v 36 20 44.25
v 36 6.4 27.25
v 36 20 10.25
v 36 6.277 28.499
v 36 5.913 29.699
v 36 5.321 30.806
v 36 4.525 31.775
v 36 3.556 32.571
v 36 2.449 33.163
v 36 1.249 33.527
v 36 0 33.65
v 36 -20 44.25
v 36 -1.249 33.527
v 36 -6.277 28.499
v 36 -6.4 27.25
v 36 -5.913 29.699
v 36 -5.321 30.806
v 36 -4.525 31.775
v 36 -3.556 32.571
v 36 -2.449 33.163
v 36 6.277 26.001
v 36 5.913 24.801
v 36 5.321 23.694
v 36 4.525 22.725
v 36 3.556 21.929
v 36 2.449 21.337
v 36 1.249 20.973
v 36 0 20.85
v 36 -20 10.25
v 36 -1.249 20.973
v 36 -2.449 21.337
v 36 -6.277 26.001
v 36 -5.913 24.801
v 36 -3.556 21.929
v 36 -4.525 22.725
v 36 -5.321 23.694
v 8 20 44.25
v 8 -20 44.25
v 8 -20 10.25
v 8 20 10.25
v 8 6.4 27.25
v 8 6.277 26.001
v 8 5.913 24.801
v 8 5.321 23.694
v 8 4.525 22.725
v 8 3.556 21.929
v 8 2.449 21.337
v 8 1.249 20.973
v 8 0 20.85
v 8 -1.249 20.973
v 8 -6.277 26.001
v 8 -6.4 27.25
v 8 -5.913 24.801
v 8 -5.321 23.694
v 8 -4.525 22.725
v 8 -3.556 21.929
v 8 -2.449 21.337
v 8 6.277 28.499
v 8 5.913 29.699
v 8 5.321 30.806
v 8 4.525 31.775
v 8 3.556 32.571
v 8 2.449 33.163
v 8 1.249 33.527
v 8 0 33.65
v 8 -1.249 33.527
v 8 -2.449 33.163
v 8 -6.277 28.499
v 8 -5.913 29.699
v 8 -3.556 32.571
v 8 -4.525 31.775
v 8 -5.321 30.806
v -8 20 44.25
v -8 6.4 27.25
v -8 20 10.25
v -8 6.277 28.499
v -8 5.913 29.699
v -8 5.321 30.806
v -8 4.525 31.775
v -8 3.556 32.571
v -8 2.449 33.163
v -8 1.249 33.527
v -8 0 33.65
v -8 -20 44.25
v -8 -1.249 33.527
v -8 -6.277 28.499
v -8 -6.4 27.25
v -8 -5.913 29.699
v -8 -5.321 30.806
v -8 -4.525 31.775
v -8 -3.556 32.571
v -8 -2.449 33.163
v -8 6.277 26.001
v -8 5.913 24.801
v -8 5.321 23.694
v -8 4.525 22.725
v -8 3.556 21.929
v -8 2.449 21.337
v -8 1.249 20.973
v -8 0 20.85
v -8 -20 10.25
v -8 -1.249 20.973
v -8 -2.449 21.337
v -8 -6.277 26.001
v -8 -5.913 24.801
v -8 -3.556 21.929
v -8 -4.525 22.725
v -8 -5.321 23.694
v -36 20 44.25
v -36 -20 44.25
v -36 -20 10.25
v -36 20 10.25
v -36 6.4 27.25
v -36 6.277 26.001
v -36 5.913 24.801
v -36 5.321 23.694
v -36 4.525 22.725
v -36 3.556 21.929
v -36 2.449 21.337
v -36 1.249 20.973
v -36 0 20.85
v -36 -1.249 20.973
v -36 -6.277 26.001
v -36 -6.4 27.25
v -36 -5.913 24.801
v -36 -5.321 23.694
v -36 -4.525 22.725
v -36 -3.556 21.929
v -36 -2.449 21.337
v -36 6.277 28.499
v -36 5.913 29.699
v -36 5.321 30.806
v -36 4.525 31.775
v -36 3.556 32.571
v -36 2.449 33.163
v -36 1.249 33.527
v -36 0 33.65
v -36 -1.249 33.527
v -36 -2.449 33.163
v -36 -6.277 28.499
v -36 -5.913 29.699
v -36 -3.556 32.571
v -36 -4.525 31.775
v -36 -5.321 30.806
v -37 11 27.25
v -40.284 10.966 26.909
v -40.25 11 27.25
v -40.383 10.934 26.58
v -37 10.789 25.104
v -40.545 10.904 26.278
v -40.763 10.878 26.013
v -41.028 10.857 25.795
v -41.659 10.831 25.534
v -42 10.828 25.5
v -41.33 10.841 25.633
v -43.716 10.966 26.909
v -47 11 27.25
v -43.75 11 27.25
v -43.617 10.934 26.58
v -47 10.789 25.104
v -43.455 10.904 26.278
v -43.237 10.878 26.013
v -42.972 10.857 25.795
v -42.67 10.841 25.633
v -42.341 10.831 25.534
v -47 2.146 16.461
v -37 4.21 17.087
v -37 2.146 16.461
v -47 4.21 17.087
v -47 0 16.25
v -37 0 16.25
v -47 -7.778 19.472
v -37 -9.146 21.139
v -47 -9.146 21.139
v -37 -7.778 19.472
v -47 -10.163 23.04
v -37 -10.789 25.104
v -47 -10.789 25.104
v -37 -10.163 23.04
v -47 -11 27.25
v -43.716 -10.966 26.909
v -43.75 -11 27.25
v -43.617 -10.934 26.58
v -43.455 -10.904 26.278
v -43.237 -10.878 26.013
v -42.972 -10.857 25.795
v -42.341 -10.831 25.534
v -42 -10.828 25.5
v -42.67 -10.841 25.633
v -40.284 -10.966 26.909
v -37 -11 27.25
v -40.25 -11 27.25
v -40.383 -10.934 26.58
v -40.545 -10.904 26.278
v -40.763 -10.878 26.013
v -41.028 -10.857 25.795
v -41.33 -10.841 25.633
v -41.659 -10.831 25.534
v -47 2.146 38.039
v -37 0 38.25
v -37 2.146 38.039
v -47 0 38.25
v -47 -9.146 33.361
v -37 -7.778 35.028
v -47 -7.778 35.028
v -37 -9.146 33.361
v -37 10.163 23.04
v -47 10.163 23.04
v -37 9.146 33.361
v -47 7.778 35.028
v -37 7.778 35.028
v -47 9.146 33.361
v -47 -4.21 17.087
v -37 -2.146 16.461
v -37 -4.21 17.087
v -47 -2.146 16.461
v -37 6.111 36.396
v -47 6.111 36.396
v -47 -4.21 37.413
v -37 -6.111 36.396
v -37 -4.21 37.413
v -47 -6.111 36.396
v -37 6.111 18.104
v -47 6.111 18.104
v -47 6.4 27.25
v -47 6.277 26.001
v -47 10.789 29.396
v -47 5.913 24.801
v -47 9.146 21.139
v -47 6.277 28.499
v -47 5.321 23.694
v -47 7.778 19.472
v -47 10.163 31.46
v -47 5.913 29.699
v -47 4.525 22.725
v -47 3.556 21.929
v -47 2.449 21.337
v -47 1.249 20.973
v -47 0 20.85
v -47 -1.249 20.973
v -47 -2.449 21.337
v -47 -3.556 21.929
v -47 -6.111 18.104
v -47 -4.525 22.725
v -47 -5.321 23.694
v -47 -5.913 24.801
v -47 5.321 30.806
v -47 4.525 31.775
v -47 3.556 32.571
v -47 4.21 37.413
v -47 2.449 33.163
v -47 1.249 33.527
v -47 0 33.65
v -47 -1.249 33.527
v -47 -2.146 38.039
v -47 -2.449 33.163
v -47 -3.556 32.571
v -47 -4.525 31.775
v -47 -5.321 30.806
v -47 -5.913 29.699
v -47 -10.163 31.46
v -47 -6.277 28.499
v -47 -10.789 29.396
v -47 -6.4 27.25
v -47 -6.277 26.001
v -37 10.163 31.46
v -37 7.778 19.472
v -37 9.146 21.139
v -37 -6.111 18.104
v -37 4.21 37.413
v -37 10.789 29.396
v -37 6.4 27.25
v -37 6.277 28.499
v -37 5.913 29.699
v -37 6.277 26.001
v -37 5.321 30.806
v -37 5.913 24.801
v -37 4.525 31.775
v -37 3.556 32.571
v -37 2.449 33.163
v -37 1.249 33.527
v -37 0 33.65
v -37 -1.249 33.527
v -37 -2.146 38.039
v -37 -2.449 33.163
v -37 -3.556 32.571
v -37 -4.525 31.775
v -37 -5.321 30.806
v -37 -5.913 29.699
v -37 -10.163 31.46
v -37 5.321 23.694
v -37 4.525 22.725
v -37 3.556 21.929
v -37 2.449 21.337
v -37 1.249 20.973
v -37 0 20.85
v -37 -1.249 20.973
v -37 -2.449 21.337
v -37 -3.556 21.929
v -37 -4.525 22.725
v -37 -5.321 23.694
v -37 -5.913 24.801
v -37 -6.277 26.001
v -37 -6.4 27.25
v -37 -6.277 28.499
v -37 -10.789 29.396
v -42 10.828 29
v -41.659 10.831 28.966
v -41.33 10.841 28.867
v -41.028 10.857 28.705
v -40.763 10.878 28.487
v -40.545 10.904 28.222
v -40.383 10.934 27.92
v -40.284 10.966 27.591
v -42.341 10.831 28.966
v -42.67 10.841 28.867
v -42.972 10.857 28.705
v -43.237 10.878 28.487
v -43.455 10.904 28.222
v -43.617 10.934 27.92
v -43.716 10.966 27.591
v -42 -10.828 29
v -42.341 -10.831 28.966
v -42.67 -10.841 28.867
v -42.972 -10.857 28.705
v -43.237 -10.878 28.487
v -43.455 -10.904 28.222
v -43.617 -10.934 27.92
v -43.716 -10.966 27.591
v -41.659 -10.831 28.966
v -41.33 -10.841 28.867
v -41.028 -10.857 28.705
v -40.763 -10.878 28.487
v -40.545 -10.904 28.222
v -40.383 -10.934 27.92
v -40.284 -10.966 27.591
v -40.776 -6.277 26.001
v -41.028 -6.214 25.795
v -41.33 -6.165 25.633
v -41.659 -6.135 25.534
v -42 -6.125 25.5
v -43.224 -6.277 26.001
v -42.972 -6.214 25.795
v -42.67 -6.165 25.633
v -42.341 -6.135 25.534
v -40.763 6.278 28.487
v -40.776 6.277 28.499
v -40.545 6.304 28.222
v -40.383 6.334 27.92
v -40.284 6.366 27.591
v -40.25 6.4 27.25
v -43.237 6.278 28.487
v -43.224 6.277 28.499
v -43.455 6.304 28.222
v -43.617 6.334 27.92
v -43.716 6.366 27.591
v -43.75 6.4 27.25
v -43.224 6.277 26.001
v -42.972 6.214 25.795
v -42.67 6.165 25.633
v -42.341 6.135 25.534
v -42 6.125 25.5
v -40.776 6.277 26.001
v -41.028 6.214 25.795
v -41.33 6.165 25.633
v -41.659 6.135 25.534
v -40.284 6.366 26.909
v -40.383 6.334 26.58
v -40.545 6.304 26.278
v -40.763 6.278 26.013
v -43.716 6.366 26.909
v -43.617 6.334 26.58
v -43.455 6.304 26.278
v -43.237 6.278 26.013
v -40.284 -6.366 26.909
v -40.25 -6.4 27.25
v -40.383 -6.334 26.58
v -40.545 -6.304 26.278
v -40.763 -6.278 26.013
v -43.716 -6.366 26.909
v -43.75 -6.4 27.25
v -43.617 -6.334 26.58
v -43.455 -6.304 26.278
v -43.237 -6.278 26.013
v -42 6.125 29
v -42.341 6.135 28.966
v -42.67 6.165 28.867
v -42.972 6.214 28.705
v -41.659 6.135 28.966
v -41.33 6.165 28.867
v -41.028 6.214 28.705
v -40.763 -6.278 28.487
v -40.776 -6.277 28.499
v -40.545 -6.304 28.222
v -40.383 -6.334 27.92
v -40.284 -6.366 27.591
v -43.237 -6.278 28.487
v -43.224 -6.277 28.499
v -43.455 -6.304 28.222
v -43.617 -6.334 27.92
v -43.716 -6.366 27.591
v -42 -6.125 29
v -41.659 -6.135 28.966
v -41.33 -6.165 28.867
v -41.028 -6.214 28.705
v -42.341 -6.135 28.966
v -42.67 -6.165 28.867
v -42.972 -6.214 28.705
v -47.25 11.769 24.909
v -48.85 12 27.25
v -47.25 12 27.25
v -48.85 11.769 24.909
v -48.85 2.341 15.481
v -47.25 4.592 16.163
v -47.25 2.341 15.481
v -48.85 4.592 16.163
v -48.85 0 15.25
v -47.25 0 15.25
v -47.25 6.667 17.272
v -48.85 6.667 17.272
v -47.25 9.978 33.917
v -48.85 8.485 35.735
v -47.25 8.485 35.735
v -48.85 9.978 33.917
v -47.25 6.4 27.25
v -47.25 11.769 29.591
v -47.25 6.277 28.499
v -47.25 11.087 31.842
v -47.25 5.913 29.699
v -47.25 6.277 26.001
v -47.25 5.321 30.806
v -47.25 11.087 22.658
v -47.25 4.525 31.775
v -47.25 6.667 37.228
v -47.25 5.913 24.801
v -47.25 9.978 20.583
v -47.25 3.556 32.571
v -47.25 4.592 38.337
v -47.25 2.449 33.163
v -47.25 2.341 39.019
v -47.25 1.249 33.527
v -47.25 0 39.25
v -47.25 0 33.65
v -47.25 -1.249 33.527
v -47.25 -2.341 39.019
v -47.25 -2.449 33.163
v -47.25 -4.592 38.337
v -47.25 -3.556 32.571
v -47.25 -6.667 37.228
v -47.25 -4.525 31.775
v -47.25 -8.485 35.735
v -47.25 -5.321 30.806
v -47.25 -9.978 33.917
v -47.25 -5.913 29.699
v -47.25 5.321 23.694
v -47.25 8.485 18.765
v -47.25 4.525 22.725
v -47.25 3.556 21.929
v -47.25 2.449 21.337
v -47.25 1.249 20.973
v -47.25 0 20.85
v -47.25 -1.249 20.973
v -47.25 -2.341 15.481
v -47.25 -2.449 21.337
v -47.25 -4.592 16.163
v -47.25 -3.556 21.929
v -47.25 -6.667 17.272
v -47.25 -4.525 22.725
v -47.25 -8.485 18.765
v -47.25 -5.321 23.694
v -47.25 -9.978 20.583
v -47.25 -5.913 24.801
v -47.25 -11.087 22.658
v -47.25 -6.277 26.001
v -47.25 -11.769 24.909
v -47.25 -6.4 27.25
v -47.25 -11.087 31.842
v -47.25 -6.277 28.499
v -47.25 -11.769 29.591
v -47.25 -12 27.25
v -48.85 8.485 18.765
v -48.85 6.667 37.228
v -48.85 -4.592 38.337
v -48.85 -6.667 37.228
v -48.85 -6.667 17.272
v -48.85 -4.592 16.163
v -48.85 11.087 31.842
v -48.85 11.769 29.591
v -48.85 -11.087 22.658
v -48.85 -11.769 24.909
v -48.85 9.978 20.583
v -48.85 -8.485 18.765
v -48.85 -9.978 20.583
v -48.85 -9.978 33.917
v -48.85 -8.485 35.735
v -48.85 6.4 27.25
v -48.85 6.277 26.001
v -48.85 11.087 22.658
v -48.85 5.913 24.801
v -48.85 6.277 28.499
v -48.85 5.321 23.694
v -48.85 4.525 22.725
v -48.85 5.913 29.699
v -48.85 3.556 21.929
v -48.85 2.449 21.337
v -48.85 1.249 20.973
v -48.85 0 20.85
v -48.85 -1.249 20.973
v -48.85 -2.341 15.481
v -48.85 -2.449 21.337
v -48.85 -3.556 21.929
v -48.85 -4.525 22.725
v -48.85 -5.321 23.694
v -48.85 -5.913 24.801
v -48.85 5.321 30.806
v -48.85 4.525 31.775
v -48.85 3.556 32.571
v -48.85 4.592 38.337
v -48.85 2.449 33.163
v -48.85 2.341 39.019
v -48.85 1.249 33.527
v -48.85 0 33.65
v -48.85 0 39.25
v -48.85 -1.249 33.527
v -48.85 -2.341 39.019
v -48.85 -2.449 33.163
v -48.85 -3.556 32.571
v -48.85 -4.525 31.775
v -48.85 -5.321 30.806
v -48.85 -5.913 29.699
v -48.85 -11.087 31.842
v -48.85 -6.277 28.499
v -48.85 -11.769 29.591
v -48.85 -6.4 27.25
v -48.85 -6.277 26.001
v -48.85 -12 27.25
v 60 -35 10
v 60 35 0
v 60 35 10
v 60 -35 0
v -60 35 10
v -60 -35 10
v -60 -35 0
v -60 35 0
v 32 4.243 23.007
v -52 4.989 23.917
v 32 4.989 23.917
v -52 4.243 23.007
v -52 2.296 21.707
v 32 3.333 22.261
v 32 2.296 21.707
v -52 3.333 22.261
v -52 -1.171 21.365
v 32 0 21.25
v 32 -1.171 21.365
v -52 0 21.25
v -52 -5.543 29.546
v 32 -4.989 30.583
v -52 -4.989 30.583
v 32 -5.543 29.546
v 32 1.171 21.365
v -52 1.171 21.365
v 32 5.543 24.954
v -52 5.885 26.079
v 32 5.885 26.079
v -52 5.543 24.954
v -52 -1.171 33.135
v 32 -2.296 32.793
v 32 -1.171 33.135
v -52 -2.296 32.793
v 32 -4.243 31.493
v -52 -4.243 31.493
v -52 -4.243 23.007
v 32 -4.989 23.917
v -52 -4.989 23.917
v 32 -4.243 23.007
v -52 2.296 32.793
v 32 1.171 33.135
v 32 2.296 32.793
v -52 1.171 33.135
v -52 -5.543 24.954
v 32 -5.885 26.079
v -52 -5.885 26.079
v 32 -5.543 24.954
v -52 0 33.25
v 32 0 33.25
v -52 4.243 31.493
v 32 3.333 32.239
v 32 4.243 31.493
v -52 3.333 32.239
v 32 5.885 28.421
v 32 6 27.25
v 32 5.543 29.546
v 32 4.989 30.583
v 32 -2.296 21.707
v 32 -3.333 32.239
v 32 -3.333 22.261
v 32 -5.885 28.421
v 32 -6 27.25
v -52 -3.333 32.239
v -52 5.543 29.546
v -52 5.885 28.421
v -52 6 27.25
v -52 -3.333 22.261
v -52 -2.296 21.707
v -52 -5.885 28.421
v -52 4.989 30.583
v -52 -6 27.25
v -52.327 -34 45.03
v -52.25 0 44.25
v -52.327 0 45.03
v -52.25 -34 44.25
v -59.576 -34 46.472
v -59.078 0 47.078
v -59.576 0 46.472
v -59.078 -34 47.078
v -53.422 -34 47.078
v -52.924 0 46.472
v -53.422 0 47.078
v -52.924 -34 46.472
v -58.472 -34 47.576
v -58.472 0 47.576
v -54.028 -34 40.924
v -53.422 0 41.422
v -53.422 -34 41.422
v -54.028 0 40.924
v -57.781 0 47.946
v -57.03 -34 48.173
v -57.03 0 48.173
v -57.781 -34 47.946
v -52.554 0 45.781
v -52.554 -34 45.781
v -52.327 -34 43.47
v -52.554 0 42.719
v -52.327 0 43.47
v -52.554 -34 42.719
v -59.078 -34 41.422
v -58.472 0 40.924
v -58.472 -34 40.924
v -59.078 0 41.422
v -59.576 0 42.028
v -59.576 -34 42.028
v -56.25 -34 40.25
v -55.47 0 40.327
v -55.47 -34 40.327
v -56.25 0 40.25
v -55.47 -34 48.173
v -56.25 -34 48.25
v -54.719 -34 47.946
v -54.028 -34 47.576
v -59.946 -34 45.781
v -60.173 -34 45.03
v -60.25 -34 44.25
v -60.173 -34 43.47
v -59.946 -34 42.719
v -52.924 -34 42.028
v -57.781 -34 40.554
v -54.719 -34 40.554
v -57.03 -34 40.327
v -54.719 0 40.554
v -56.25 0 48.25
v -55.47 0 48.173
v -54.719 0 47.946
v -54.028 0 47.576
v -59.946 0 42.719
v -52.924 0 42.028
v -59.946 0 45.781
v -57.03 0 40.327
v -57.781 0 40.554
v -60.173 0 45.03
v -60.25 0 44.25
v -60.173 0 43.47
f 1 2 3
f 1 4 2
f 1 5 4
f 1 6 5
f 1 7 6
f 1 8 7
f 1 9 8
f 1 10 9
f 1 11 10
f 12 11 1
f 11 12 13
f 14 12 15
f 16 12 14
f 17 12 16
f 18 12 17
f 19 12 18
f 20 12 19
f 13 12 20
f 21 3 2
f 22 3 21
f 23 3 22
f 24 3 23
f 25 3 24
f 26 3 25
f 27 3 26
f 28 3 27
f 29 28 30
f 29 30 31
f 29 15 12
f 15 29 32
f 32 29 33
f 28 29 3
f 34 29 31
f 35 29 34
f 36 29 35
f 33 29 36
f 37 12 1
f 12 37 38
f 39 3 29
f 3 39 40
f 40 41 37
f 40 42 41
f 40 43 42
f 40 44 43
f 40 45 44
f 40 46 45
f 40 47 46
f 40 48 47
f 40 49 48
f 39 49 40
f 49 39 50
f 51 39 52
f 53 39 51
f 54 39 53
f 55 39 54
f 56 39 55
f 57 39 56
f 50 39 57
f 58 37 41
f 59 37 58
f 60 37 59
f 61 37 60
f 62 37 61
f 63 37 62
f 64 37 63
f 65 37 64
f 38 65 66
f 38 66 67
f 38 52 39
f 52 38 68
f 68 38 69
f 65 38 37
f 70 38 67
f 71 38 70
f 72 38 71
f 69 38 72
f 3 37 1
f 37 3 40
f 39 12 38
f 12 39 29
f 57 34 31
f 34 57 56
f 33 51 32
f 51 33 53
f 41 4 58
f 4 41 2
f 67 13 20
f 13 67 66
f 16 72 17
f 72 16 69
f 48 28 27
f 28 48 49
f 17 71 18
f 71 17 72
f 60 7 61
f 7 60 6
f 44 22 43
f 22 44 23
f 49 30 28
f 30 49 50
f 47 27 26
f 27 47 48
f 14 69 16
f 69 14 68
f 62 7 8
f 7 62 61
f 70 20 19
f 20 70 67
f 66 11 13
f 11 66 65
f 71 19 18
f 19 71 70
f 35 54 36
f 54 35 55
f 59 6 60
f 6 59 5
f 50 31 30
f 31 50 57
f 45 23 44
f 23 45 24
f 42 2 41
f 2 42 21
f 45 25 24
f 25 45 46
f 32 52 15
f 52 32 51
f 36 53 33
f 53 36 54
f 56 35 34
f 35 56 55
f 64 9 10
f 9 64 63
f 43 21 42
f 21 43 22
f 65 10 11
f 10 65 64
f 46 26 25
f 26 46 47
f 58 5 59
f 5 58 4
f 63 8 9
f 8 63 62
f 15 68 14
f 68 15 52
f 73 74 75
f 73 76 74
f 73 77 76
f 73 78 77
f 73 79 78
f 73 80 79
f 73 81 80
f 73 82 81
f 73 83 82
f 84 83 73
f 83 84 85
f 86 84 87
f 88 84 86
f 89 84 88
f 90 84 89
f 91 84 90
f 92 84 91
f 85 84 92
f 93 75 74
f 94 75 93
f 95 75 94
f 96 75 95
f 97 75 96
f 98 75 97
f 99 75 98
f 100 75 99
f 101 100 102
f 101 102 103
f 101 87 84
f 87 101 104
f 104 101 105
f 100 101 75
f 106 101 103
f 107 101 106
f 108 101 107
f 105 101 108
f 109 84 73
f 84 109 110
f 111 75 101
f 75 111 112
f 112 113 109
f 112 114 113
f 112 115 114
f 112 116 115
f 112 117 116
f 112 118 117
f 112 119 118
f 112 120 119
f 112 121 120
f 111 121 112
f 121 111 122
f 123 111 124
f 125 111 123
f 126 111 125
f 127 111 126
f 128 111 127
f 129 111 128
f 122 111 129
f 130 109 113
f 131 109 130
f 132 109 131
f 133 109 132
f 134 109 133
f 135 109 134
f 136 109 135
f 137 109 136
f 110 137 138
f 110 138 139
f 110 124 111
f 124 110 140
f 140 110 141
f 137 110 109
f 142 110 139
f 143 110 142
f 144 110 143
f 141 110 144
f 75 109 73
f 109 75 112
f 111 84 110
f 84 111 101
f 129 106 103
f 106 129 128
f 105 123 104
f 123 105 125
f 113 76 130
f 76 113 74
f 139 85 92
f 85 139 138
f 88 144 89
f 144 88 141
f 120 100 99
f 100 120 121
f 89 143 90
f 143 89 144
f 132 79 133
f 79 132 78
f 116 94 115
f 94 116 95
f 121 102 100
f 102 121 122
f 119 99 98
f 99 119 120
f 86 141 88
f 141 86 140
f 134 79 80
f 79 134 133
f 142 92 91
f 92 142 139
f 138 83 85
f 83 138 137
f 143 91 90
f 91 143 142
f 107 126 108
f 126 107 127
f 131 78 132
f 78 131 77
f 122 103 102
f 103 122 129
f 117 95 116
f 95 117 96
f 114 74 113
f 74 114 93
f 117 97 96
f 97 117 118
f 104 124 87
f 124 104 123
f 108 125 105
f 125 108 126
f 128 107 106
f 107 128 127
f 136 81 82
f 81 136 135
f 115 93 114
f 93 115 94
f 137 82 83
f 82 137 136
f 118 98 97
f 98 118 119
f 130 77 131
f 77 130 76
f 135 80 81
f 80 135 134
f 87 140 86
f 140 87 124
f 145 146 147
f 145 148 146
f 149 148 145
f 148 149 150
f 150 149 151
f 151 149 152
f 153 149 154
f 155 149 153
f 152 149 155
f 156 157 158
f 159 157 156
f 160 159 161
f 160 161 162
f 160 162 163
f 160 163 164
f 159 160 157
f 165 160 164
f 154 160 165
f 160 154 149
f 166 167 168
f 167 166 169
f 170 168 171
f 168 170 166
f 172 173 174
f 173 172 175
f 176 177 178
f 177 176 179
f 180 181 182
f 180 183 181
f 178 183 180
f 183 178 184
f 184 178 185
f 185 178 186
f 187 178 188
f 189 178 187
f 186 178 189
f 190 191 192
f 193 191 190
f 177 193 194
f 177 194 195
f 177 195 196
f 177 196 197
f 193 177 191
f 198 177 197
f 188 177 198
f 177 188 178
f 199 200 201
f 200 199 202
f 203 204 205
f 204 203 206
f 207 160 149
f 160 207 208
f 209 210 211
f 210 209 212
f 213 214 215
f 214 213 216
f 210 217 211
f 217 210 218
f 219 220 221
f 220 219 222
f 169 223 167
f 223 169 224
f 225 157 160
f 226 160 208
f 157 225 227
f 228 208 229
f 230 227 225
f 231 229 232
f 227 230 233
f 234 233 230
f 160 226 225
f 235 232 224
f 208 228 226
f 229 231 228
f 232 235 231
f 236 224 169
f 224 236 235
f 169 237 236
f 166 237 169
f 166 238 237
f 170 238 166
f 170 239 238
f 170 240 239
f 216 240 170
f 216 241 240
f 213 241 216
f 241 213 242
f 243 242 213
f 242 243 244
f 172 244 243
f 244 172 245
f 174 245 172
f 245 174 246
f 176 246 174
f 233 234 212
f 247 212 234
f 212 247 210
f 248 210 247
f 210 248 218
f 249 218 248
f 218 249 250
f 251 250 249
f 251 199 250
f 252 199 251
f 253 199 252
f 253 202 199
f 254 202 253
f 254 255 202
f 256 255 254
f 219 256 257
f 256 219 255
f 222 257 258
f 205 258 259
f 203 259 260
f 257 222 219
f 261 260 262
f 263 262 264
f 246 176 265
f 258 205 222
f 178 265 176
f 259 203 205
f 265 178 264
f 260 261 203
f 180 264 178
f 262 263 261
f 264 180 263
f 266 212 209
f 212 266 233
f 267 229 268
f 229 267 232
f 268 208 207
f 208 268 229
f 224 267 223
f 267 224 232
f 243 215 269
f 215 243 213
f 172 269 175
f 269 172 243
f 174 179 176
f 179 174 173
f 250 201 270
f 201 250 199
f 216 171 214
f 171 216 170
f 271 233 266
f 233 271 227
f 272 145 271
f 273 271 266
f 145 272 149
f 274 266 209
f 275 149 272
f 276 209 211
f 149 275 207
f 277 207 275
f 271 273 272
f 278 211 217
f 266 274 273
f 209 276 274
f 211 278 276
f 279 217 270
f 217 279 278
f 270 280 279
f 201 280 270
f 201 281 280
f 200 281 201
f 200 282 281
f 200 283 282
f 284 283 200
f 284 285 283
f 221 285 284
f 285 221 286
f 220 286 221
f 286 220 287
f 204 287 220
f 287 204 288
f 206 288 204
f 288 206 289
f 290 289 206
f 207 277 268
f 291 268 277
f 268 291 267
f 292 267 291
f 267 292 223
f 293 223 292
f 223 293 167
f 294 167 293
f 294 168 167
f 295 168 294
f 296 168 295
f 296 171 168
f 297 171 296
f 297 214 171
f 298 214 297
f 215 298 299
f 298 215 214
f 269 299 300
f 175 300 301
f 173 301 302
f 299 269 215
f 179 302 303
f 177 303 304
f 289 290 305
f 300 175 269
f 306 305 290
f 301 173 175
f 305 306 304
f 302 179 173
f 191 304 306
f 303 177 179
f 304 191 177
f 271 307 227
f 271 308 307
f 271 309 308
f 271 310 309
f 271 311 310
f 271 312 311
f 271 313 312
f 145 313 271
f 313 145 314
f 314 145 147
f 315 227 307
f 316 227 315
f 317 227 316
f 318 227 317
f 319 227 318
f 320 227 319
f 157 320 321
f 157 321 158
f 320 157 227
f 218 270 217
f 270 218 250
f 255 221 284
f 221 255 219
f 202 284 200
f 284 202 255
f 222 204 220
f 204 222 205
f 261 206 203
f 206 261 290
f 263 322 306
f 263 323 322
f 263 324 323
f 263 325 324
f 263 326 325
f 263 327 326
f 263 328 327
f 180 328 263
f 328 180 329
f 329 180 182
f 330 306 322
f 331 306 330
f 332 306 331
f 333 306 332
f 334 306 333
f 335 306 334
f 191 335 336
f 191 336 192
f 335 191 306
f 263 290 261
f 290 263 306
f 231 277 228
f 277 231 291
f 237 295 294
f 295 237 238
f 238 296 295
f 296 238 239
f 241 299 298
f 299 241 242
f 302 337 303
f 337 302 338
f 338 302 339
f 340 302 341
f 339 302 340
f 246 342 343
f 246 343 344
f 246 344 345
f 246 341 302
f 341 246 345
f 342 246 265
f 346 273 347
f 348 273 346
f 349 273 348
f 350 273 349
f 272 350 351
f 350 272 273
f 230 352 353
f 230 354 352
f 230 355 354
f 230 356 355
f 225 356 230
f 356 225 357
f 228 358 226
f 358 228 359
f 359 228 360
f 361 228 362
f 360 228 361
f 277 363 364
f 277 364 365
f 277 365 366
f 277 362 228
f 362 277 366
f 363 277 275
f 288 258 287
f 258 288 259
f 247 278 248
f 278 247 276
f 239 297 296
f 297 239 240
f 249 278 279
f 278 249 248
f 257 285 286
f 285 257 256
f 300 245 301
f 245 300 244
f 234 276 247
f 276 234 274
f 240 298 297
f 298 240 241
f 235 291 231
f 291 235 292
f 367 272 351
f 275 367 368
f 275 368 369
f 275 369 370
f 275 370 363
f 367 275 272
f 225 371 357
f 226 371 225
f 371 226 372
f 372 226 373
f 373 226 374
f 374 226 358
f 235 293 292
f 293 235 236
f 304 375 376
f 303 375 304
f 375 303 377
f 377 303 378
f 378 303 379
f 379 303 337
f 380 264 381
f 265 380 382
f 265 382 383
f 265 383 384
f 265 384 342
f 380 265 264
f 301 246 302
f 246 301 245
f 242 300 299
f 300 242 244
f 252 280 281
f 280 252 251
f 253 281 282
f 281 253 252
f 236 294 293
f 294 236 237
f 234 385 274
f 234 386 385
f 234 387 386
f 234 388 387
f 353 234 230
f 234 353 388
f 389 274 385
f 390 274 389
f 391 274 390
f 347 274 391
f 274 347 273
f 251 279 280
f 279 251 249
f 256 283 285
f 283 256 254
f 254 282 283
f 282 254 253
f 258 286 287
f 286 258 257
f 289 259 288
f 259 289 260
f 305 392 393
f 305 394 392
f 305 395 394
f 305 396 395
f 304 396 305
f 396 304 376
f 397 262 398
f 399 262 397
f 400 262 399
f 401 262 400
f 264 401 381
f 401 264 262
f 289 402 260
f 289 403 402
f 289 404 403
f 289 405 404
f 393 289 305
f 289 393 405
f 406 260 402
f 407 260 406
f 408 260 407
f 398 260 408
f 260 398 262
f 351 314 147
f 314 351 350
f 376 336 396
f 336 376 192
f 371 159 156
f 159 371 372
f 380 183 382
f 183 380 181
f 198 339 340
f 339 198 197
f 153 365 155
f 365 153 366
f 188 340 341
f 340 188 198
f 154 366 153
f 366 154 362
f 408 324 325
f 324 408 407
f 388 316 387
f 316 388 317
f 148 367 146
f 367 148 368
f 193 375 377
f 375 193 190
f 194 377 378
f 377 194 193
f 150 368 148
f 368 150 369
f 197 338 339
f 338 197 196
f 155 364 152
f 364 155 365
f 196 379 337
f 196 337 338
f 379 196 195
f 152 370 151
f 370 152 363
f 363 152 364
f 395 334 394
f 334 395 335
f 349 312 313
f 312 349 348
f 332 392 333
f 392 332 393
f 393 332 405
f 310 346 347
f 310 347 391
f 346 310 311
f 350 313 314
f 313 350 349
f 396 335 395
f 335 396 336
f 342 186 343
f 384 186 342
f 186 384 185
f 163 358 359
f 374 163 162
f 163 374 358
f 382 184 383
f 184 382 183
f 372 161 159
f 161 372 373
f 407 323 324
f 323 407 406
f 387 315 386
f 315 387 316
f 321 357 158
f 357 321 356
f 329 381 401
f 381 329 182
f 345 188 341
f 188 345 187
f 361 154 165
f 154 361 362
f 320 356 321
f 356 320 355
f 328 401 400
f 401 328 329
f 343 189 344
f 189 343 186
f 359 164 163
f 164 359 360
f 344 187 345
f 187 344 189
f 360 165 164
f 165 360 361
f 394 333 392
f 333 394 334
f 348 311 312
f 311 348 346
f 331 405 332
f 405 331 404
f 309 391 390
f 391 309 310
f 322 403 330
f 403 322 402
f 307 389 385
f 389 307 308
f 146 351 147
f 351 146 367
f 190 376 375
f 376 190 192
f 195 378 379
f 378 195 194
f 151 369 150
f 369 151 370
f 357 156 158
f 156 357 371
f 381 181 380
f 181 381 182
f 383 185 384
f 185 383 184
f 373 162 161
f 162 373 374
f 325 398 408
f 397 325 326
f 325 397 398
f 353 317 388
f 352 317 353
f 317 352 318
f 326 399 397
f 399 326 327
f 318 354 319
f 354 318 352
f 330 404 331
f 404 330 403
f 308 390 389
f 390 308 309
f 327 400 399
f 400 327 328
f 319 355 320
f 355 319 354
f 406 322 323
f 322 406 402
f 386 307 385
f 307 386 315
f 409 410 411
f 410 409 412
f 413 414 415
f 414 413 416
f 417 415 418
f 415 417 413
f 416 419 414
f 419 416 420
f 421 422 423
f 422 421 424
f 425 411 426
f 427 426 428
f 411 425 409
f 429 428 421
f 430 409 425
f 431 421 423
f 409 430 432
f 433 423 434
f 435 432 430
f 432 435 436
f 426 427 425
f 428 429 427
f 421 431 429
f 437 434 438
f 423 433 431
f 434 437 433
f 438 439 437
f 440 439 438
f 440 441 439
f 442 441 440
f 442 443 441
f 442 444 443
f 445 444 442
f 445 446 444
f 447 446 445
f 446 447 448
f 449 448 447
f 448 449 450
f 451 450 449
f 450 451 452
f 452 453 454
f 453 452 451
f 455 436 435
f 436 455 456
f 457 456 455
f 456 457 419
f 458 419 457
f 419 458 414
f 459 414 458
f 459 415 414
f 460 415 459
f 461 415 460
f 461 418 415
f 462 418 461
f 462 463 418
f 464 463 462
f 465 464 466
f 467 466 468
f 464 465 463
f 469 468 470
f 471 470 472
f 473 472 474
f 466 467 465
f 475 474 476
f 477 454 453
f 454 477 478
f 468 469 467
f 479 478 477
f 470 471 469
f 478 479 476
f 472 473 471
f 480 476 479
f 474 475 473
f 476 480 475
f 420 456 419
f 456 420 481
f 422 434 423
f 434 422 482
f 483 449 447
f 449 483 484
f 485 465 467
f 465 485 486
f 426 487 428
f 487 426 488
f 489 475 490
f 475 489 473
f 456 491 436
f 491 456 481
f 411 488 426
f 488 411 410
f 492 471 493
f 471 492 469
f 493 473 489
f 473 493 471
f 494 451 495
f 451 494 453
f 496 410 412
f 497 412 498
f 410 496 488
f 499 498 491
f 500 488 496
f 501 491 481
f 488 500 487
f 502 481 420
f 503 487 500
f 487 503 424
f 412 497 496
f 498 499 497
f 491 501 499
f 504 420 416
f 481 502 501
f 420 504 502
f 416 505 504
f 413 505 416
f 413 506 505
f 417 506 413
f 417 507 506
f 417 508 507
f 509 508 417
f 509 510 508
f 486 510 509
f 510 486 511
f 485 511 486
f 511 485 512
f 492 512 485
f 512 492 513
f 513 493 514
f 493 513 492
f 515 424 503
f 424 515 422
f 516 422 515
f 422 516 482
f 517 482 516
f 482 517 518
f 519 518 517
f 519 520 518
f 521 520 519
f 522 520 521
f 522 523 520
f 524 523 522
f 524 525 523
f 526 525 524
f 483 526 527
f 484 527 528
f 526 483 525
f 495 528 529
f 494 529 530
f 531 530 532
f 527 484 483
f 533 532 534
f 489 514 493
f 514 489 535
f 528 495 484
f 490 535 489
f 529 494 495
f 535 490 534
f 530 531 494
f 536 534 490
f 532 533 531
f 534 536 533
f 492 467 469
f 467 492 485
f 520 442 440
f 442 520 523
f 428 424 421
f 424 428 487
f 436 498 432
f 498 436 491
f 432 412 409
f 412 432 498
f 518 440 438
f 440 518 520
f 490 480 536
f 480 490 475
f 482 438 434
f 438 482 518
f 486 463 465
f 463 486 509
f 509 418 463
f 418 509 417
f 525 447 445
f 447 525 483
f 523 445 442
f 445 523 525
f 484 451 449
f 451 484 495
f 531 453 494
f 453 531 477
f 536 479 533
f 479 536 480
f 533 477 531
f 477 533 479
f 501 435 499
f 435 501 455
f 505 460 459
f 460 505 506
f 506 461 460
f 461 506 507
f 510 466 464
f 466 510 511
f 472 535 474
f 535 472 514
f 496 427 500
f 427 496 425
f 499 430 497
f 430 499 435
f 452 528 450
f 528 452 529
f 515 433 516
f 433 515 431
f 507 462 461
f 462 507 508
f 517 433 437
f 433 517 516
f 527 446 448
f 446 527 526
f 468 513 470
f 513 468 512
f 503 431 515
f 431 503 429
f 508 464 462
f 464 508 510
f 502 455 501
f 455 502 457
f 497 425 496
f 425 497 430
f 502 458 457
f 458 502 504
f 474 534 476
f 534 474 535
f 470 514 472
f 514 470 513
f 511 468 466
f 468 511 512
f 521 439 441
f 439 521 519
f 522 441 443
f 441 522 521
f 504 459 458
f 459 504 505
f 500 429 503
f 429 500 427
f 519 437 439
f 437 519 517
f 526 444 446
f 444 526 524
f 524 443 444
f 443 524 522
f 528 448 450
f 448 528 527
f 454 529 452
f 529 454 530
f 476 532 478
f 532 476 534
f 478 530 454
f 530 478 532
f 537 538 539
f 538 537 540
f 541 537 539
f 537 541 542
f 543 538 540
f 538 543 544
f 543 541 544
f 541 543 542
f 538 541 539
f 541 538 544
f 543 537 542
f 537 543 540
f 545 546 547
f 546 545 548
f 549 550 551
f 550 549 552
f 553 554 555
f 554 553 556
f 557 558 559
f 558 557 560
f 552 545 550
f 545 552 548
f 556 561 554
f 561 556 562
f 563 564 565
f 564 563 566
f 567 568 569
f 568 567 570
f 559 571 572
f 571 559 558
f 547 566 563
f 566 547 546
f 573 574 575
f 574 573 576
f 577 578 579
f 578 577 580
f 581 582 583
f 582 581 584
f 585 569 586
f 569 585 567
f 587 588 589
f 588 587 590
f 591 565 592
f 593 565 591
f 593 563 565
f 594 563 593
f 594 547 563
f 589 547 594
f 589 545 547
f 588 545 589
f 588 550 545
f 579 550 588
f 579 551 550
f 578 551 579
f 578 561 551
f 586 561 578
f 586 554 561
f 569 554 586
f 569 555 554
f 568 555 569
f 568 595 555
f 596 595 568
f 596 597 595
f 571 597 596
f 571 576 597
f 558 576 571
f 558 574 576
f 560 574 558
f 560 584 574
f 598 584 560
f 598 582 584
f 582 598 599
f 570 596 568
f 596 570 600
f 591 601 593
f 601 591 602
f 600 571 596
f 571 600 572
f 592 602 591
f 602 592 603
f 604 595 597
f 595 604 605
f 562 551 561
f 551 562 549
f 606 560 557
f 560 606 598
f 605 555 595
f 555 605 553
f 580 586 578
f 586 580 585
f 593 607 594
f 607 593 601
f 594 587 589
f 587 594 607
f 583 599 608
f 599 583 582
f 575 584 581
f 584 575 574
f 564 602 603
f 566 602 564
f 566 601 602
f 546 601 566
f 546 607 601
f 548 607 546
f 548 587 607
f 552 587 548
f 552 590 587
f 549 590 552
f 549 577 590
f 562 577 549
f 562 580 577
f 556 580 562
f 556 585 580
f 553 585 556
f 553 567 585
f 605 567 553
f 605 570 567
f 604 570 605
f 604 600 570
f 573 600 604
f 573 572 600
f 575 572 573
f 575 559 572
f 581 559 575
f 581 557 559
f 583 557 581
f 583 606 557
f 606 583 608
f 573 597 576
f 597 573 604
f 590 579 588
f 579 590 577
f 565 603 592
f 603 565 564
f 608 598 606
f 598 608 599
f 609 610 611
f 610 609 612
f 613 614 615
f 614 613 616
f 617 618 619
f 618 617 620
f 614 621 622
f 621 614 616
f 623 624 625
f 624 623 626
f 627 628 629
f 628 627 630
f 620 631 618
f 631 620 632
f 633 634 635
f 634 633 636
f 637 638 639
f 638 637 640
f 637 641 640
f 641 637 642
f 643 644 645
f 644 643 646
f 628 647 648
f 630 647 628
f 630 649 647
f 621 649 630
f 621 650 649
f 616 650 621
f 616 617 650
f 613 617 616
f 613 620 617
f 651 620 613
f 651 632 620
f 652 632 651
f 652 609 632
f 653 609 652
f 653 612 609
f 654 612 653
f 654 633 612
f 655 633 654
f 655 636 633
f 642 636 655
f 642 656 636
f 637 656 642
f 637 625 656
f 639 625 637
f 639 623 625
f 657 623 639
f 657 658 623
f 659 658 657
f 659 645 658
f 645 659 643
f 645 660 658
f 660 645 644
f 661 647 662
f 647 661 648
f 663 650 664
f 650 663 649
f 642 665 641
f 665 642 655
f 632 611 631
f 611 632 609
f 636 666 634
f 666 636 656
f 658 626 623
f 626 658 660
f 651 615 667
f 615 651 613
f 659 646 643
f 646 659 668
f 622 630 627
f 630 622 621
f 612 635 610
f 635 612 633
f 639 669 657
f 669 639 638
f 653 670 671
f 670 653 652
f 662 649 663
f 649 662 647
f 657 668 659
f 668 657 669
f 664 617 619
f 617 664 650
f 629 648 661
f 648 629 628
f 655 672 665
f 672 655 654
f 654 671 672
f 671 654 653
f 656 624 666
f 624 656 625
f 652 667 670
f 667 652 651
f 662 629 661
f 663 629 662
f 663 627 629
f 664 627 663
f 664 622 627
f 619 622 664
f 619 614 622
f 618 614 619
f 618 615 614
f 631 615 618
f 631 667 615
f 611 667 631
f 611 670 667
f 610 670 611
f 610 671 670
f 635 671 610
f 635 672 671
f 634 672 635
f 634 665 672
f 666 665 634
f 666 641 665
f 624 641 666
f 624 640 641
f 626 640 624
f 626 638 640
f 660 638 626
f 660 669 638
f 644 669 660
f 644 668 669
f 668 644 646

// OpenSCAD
$fn = 32;

// ------------------------------------------------------------------------
// Machine vise: screw d12, jaws 28 x 34 mm
// Every part is its own module, assembly() places every instance.
// ------------------------------------------------------------------------

// --- part 1 ---
module vise_bed() {
  difference() {
    translate([-60, -35, 0]) cube([120, 70, 10]);
  }
}

// --- part 2 ---
module vise_jaw() {
  difference() {
    translate([-14, -20, 0]) cube([28, 40, 34]);
    translate([0, 0, 17]) rotate([0, 90, 0]) cylinder(h = 30, d = 12.8, center = true);
  }
}

// --- part 3 ---
module vise_screw() {
  translate([0, 0, -42]) cylinder(h = 84, d = 12);
}

// --- part 4 ---
module screw_collar() {
  difference() {
    cylinder(h = 10, d = 22);
    translate([0, 0, -1]) cylinder(h = 12, d = 12.8);
    translate([0, 0, 5]) rotate([90, 0, 0]) cylinder(h = 24, d = 3.5, center = true);
  }
}

// --- part 5 ---
module screw_washer() {
  difference() {
      translate([0, 0, 0]) cylinder(h = 1.6, d = 24);
      translate([0, 0, -1]) cylinder(h = 3.6, d = 12.8);
    }
}

// --- part 6 ---
module vise_handle() {
  cylinder(h = 34, d = 8);
}

// --- assembly ---
module assembly() {
  color([0.80, 0.24, 0.20]) translate([0, 0, 0]) rotate([0, 0, 0]) vise_bed();
  color([0.20, 0.45, 0.75]) translate([22, 0, 10.25]) rotate([0, 0, 0]) vise_jaw();
  color([0.25, 0.62, 0.32]) translate([-22, 0, 10.25]) rotate([0, 0, 0]) vise_jaw();
  color([0.92, 0.70, 0.18]) translate([-10, 0, 27.25]) rotate([0, 90, 0]) vise_screw();
  color([0.58, 0.35, 0.70]) translate([-47, 0, 27.25]) rotate([0, 90, 0]) screw_collar();
  color([0.16, 0.66, 0.66]) translate([-48.85, 0, 27.25]) rotate([0, 90, 0]) screw_washer();
  color([0.85, 0.48, 0.18]) translate([-56.25, 0, 44.25]) rotate([90, 0, 0]) vise_handle();
}

assembly();
